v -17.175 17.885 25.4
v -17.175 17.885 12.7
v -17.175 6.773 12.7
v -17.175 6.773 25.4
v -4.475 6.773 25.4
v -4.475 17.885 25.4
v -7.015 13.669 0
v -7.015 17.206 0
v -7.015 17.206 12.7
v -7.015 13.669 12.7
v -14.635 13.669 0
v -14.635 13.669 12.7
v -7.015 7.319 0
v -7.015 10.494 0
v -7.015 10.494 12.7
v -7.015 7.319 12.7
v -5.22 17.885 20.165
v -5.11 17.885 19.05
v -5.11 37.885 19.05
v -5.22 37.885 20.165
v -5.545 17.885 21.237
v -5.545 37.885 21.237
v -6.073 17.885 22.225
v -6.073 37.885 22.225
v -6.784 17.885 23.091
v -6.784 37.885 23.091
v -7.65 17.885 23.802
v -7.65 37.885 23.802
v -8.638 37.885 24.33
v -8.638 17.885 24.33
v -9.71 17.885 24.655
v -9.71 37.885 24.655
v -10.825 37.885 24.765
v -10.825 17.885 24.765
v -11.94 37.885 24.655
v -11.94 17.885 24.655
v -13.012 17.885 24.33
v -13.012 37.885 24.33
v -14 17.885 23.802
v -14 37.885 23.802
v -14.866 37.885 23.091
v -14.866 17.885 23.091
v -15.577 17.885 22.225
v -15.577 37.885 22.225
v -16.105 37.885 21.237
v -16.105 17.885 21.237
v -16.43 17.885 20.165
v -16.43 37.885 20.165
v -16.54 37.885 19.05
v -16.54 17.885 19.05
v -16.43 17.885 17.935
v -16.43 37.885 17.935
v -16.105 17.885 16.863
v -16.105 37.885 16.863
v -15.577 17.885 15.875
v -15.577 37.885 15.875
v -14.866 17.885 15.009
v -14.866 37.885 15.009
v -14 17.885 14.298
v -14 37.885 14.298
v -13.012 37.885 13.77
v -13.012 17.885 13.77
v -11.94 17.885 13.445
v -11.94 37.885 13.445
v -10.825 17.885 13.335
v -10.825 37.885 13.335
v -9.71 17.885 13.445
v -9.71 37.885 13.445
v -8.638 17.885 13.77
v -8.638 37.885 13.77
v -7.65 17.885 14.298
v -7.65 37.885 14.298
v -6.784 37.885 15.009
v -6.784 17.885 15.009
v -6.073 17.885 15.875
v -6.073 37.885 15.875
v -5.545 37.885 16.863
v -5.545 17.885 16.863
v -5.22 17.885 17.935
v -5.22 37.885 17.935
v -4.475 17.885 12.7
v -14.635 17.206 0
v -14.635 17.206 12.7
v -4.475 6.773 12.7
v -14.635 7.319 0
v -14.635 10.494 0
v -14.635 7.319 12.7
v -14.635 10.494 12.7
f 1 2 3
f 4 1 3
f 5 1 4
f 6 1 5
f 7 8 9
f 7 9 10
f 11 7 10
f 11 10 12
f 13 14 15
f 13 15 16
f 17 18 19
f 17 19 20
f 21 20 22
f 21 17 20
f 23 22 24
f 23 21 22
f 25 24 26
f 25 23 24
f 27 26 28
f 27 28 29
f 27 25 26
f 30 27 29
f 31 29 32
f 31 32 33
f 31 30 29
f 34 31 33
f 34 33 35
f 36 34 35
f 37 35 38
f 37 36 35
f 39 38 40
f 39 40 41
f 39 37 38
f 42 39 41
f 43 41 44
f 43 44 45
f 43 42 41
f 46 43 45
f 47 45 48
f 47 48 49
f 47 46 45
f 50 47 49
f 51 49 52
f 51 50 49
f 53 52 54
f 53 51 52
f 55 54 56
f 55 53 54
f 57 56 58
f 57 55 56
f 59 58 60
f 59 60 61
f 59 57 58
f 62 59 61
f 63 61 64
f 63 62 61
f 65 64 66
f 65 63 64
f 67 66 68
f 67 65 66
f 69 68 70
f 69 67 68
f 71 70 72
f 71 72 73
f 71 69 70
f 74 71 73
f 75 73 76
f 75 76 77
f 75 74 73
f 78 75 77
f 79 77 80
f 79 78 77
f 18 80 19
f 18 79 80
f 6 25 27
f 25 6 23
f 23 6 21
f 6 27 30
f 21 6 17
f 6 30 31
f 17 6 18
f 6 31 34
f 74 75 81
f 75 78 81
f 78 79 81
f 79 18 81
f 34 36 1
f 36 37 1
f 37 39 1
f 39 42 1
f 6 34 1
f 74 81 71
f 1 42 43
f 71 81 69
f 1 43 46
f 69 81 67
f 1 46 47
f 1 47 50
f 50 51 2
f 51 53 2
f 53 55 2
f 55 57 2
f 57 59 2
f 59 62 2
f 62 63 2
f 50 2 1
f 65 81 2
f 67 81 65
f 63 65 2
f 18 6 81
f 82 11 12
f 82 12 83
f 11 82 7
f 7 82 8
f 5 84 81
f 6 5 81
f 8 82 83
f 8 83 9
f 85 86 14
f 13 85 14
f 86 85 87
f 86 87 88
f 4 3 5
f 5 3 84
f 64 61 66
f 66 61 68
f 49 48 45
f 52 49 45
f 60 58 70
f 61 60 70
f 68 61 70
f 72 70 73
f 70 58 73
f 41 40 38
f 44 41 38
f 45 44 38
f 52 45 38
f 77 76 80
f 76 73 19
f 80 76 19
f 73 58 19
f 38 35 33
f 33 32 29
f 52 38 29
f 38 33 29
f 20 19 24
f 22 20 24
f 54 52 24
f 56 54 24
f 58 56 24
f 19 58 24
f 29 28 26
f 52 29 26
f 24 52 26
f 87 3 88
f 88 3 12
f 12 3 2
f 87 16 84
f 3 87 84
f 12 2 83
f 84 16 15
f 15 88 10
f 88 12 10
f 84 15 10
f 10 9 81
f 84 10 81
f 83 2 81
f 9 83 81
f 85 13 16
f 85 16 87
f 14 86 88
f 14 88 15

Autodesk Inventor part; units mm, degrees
ref_plane "YZ Plane" through (0, 0, 0) normal (1, 0, 0) x (0, 1, 0)
ref_plane "XZ Plane" through (0, 0, 0) normal (0, 1, 0) x (-1, 0, 0)
ref_plane "XY Plane" through (0, 0, 0) normal (0, 0, 1) x (1, 0, 0)
ref_plane "Work Plane1" through (-10.8248, 8.3603, 0) normal (0, 0, 1) x (1, 0, 0)
sketch "Sketch1" plane through (-10.8248, 8.3603, 0) normal (0, 0, 1) x (1, 0, 0)
  line L0 (-3.81, 2.1338) -> (3.81, 2.1338) projected
  line L1 (3.81, 2.1338) -> (3.81, 5.3088) projected
  line L2 (3.81, 5.3088) -> (-3.81, 5.3088) projected
  line L3 (-3.81, 5.3088) -> (-3.81, 2.1338) projected
  line L4 (3.81, -1.0412) -> (-3.81, -1.0412) projected
  line L5 (-3.81, -1.0412) -> (-3.81, -4.2162) projected
  line L6 (-3.81, -4.2162) -> (3.81, -4.2162) projected
  line L7 (3.81, -4.2162) -> (3.81, -1.0412) projected
  line L8 (3.81, -1.0412) -> (-3.81, -1.0412)
  line L9 (-3.81, -1.0412) -> (-3.81, 2.1338)
  line L10 (-3.81, 2.1338) -> (3.81, 2.1338)
  line L11 (3.81, 2.1338) -> (3.81, -1.0412)
  line L12 (3.81, 5.3088) -> (-3.81, 5.3088)
  line L13 (-3.81, 5.3088) -> (-3.81, 8.8452)
  line L14 (-3.81, 8.8452) -> (3.81, 8.8452)
  line L15 (3.81, 8.8452) -> (3.81, 5.3088)
  point P0 (10.8248, -8.3603)
extrude "Extrusion1" add sketch "Sketch1" along normal blind 12.7 contours L0 L11 L4 L9 | L13 L14 L15 L2
sketch "Sketch2" plane through (-10.8248, 8.3603, 12.7) normal (0, 0, 1) x (1, 0, 0)
  line L0 (-6.35, -1.5875) -> (6.35, -1.5875)
  line L1 (6.35, -1.5875) -> (6.35, 9.525)
  line L2 (6.35, 9.525) -> (-6.35, 9.525)
  line L3 (-6.35, 9.525) -> (-6.35, -1.5875)
  point P0 (10.8248, -8.3603)
extrude "Extrusion2" add sketch "Sketch2" along normal blind 12.7
sketch "Sketch4" plane through (-17.1748, 17.8853, 12.7) normal (0, -1, 0) x (1, 0, 0)
  circle A0 centre (6.35, 6.35) radius 5.715
  point P0 (17.1748, -12.7)
  dimension "d4" = 11.43
extrude "Extrusion3" add sketch "Sketch4" against normal blind 20
properties part number "Joint_Wheel_Connect"
